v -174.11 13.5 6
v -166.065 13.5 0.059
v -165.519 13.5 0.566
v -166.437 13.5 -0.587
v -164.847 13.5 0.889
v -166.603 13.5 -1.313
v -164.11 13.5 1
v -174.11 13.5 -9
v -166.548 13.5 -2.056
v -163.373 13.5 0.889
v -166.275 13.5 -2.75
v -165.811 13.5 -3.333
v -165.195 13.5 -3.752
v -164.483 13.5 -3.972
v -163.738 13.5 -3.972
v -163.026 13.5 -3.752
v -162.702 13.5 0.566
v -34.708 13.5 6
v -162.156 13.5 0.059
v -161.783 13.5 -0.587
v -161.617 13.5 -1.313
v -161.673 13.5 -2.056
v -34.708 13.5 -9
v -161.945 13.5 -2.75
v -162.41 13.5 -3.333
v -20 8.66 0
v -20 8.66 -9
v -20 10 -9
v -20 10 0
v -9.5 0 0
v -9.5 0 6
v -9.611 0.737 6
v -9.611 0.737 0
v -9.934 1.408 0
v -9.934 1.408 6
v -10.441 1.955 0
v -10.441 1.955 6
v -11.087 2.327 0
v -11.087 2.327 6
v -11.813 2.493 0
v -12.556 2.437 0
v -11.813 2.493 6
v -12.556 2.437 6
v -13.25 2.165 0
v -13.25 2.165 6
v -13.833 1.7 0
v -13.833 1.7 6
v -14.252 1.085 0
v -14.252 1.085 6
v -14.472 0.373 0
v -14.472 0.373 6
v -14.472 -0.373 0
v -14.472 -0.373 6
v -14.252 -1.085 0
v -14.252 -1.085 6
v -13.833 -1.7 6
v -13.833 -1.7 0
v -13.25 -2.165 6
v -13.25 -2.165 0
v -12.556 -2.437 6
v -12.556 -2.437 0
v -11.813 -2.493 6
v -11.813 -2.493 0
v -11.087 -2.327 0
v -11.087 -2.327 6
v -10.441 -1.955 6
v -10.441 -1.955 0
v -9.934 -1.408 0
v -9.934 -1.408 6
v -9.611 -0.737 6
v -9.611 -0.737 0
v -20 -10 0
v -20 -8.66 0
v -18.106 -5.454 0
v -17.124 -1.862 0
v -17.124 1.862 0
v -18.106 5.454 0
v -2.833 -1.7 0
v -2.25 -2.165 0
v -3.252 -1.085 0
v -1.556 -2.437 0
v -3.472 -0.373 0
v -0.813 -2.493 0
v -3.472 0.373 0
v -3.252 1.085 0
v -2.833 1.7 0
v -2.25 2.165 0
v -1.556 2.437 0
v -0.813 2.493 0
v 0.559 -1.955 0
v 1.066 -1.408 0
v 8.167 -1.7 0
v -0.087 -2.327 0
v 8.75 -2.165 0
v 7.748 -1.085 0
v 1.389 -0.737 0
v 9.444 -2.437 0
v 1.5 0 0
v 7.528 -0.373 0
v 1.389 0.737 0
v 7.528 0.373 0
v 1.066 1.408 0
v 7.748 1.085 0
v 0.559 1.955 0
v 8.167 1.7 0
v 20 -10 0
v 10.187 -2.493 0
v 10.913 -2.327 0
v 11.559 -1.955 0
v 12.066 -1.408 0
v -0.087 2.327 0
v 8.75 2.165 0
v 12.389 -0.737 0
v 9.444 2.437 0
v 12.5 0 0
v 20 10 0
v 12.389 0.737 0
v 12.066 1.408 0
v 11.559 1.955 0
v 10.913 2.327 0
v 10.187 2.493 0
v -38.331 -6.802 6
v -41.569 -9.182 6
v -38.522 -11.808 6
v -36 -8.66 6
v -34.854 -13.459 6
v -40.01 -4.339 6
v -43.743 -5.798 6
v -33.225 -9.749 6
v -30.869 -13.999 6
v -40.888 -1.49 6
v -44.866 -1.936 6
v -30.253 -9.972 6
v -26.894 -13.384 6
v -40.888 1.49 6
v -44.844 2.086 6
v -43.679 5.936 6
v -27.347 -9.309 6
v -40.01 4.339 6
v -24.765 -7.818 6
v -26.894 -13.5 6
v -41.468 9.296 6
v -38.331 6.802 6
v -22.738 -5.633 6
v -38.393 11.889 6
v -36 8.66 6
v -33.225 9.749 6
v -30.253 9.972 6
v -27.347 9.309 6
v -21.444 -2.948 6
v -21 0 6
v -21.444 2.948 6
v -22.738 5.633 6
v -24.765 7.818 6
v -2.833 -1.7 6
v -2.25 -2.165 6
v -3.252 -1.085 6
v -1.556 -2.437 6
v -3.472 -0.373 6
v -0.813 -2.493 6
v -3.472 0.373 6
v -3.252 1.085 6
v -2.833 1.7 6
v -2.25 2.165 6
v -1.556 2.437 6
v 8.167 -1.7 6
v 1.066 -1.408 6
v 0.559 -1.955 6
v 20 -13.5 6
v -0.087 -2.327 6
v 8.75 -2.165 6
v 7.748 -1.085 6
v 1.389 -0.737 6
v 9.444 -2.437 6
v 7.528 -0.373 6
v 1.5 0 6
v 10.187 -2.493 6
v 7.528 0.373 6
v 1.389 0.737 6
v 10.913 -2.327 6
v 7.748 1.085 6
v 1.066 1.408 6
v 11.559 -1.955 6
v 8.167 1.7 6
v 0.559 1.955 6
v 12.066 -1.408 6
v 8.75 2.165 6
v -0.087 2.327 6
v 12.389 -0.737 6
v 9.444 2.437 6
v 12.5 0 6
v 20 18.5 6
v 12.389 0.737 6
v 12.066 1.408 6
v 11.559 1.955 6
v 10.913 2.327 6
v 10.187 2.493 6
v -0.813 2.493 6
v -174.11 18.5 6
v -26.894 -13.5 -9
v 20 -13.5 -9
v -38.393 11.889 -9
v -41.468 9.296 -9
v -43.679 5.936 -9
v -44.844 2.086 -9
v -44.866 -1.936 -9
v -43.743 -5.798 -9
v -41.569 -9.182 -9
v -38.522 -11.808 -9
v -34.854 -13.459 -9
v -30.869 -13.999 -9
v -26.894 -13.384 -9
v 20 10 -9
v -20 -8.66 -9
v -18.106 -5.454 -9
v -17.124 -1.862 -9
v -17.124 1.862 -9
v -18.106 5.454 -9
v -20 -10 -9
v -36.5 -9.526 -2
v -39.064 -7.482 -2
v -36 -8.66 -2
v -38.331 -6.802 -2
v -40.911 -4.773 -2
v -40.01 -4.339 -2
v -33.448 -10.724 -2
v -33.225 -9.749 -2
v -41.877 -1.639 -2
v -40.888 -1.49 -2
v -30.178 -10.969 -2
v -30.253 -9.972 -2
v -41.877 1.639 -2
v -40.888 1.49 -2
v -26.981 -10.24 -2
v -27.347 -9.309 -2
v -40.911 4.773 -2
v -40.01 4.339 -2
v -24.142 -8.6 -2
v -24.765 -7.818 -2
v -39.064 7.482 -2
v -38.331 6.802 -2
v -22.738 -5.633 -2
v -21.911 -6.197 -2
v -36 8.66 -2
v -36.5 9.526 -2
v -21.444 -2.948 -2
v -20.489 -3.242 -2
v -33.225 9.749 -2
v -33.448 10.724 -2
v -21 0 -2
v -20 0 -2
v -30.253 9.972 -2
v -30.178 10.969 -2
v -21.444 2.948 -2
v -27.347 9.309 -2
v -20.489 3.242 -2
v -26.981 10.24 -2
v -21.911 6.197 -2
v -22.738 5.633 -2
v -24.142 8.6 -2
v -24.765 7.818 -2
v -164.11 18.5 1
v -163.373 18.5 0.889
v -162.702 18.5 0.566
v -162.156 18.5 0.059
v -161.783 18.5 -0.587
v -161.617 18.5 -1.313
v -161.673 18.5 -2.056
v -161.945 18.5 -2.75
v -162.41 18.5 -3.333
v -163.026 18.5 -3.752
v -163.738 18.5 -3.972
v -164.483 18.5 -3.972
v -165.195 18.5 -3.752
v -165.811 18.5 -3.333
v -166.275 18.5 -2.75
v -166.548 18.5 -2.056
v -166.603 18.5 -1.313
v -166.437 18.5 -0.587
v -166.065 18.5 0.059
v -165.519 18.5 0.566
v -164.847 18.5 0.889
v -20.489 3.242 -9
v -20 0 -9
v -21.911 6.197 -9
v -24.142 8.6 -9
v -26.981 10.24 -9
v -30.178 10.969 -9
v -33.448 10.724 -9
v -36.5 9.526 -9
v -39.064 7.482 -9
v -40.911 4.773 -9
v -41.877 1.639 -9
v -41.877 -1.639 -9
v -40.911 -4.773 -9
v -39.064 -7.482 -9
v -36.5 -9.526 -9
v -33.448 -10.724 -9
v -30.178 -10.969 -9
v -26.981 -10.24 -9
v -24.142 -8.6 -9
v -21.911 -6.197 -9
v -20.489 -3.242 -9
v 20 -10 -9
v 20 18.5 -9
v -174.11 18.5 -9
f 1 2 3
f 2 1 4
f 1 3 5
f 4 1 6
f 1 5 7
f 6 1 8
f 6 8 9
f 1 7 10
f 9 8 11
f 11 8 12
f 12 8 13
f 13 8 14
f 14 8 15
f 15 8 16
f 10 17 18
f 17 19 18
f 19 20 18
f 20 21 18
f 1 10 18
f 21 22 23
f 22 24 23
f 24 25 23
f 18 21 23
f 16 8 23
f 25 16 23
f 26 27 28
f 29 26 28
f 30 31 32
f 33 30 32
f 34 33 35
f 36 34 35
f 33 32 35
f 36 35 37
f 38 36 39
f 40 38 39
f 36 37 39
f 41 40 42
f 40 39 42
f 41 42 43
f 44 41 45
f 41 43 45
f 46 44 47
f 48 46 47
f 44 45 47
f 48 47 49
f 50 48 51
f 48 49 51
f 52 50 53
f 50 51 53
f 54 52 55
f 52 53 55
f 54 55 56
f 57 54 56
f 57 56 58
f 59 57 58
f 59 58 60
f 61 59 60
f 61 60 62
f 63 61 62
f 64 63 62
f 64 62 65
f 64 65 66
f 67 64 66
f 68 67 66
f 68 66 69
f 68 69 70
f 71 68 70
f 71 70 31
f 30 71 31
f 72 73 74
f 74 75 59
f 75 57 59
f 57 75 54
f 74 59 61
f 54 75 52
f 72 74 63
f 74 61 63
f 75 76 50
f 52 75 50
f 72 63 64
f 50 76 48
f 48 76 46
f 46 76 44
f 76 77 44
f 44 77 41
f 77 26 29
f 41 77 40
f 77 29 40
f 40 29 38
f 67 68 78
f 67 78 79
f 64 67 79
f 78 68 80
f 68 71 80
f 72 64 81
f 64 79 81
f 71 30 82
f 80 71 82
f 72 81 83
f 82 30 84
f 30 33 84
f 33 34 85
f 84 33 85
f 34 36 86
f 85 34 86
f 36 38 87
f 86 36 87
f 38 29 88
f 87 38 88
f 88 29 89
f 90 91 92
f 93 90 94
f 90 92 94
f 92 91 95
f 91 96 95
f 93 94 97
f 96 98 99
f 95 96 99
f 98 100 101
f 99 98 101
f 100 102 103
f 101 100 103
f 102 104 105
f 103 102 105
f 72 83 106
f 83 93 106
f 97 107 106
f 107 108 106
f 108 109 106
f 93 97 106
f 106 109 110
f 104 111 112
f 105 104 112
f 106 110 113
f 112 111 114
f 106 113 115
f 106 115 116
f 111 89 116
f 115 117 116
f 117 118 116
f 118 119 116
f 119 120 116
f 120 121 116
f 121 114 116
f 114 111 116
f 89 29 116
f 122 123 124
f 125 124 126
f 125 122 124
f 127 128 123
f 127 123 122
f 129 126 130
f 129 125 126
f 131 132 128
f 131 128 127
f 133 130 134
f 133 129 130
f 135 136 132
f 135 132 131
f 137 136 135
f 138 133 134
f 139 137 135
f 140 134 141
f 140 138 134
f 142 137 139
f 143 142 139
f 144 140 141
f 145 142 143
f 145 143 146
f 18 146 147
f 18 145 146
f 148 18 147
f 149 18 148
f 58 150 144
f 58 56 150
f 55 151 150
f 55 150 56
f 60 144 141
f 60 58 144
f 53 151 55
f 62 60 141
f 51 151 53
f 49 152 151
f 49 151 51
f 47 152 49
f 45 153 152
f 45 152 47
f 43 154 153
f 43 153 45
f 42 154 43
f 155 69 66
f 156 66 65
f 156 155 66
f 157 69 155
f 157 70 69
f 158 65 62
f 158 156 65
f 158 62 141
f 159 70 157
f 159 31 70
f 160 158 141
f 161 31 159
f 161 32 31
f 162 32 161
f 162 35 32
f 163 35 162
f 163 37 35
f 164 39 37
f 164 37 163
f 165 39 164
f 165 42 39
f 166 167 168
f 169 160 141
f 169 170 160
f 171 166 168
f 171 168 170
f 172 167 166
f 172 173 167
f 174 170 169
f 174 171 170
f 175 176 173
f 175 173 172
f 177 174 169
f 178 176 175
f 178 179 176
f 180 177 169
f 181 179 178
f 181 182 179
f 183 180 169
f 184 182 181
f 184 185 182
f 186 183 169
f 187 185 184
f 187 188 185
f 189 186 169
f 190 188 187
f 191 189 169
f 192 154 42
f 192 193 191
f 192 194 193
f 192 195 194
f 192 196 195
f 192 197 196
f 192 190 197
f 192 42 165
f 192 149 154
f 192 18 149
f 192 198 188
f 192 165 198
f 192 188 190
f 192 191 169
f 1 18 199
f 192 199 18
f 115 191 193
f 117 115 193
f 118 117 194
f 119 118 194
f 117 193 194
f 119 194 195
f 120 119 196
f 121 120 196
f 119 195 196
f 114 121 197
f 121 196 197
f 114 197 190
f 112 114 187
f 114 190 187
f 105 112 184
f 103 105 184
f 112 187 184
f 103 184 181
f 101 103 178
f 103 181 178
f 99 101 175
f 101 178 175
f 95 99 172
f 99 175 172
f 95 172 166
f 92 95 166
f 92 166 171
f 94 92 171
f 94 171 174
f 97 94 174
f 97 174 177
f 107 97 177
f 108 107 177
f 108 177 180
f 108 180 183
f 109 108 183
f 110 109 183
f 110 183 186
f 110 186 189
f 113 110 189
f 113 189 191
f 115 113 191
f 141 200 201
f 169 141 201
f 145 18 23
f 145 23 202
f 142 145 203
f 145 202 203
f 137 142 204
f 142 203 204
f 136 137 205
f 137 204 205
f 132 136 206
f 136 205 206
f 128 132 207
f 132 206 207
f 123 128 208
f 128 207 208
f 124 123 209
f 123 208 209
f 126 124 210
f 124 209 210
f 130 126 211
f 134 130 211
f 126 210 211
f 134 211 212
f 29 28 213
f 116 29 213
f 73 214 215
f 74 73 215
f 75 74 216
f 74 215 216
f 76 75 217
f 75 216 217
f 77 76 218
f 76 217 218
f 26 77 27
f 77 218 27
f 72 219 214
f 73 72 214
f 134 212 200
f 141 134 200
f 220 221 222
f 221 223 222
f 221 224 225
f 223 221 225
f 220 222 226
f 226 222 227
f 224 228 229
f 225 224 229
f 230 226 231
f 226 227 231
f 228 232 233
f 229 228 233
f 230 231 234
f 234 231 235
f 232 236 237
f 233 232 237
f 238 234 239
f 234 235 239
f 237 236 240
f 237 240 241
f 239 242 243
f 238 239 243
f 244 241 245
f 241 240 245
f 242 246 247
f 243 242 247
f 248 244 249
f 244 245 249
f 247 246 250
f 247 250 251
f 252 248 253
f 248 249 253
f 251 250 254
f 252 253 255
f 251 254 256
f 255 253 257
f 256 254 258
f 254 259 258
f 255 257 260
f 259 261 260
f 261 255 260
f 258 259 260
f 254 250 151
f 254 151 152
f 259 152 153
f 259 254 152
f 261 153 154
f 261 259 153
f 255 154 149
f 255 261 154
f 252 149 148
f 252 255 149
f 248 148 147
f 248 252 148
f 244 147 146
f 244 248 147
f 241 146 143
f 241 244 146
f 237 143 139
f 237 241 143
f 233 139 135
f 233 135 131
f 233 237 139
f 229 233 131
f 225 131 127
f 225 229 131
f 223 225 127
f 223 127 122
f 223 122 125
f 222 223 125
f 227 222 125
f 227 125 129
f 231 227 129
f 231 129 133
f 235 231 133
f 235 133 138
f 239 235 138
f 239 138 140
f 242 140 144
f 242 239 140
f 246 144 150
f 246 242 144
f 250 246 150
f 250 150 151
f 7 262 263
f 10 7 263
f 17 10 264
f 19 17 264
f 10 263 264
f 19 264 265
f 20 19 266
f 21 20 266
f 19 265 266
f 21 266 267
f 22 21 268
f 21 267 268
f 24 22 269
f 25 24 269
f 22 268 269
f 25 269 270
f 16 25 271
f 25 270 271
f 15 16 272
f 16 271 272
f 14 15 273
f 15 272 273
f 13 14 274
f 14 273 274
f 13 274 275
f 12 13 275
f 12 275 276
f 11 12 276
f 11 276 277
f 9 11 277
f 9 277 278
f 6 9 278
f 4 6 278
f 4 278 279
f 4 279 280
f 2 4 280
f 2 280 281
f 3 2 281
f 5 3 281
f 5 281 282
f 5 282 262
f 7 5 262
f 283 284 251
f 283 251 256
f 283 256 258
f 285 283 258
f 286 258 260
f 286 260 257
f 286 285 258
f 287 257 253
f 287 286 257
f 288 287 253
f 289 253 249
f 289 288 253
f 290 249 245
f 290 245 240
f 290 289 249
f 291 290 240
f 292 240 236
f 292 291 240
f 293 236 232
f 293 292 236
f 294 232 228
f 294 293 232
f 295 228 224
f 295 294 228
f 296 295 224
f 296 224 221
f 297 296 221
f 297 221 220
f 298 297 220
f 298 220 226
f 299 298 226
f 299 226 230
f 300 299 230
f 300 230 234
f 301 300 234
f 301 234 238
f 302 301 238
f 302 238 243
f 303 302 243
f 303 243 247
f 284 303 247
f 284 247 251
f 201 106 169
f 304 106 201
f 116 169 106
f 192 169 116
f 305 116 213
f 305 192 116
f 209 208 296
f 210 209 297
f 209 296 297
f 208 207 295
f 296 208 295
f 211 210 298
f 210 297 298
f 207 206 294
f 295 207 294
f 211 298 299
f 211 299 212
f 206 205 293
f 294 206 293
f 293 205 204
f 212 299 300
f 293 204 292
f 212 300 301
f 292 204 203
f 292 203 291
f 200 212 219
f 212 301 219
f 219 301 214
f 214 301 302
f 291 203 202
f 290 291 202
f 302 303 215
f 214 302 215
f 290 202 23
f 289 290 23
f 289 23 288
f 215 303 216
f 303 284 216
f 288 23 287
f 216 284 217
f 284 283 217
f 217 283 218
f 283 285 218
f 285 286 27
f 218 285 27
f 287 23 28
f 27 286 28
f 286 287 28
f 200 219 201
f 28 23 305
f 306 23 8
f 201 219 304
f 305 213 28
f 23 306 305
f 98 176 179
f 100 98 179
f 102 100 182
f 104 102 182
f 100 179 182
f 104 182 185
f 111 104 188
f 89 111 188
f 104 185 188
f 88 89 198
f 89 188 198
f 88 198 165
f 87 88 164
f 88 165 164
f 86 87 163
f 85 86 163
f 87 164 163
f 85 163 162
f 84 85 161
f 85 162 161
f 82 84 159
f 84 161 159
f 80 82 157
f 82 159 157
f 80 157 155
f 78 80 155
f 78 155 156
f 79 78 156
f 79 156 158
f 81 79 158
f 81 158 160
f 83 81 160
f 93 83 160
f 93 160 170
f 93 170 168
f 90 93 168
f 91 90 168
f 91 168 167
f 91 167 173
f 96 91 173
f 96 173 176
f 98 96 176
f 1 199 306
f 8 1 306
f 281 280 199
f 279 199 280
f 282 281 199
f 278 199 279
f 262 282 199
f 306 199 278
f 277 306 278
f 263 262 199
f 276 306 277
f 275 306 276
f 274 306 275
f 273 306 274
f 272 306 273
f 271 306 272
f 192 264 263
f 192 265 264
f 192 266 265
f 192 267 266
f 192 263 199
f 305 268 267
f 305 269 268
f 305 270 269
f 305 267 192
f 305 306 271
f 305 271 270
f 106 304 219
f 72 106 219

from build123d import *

# Parameters (mm, degrees)
SKETCH_1_W          = 40
SKETCH_1_H          = 20
EXTRUDE_1_DEPTH     = 6
SKETCH_2_R          = 2.5
CUT_EXTRUDE_1_DEPTH = 24.151673806
EXTRUDE_START       = -15
EXTRUDE_2_OUTLINE_R = 11
EXTRUDE_2_DEPTH     = 15
EXTRUDE_START_2     = -8
SKETCH_5_R          = 11
SKETCH_5_R_2        = 10
EXTRUDE_3_DEPTH     = 8
SKETCH_8_W          = 15
SKETCH_8_H          = 5
EXTRUDE_4_DEPTH     = 200
SKETCH_9_W          = 4.403653586
SKETCH_9_H          = 3.736433346
EXTRUDE_5_DEPTH     = 15
SKETCH_13_W         = 64.67728996
SKETCH_13_H         = 18.524474632
CUT_EXTRUDE_2_DEPTH = 184.131783151
SKETCH_15_W         = 55.676477601
SKETCH_15_H         = 15
EXTRUDE_6_DEPTH     = 5
SKETCH_16_R         = 2.5
CUT_EXTRUDE_3_DEPTH = 10


# Read off the part's stored shape, not the designer's step: 凸台-拉伸2
with BuildPart() as part:
    # 草图1 → 凸台-拉伸1 (new body)
    with BuildSketch(Plane.XY):
        Rectangle(SKETCH_1_W, SKETCH_1_H)
    extrude(amount=EXTRUDE_1_DEPTH)

    # 草图2 → 切除-拉伸1 (cut, through all)
    with BuildSketch(Plane.XY.offset(6)):
        with Locations((10, 0)):
            Circle(SKETCH_2_R)
        with Locations((-1, 0)):
            Circle(SKETCH_2_R)
        with Locations((-12, 0)):
            Circle(SKETCH_2_R)
    extrude(amount=-CUT_EXTRUDE_1_DEPTH, mode=Mode.SUBTRACT)

    # 凸台-拉伸2 outline → 凸台-拉伸2 (add)
    with BuildSketch(Plane.XY.offset(6).offset(EXTRUDE_START)):
        with BuildLine():
            Line((20, 10), (20, 13.5))
            Line((20, 13.5), (-26.893967141, 13.5))
            Line((-26.893967141, 13.5), (-26.893967141, 13.384337644))
            ThreePointArc((-26.893967141, 13.384337644), (-45, 0), (-26.893967141, -13.384337644))
            Line((-26.893967141, -13.384337644), (-26.893967141, -13.5))
            Line((-26.893967141, -13.5), (20, -13.5))
            Line((20, -13.5), (20, -10))
            Line((20, -10), (-20, -10))
            Line((-20, -10), (-20, -8.660254038))
            ThreePointArc((-20, -8.660254038), (-17, 0), (-20, 8.660254038))
            Line((-20, 8.660254038), (-20, 10))
            Line((-20, 10), (20, 10))
        make_face()
        with Locations((-31, 0)):
            Circle(EXTRUDE_2_OUTLINE_R, mode=Mode.SUBTRACT)
    extrude(amount=EXTRUDE_2_DEPTH)

    # 草图5 → 凸台-拉伸3 (add)
    with BuildSketch(Plane.XY.offset(6).offset(EXTRUDE_START_2)):
        with Locations((-31, 0)):
            Circle(SKETCH_5_R)
        with Locations((-31, 0)):
            Circle(SKETCH_5_R_2, mode=Mode.SUBTRACT)
    extrude(amount=EXTRUDE_3_DEPTH)

    # 草图8 → 凸台-拉伸4 (add)
    with BuildSketch(Plane(origin=(20, 0, 0), x_dir=(0, 0, -1), z_dir=(1, 0, 0))):
        with Locations((1.5, 16)):
            Rectangle(SKETCH_8_W, SKETCH_8_H)
    extrude(amount=-EXTRUDE_4_DEPTH)

    # 草图9 → 凸台-拉伸5 (add, through all)
    with BuildSketch(Plane.XY.offset(6)):
        with Locations((-27.364497847, 13.796597935)):
            Rectangle(SKETCH_9_W, SKETCH_9_H)
    extrude(amount=-EXTRUDE_5_DEPTH)

    # 草图13 → 切除-拉伸2 (cut, through all)
    with BuildSketch(Plane(origin=(0, 18.5, 0), x_dir=(1, 0, 0), z_dir=(0, 1, 0))):
        with Locations((-150.772464122, 3.262237316)):
            Rectangle(SKETCH_13_W, SKETCH_13_H)
    extrude(amount=-CUT_EXTRUDE_2_DEPTH, mode=Mode.SUBTRACT)

    # 草图15 → 凸台-拉伸6 (add)
    with BuildSketch(Plane(origin=(0, 18.5, 0), x_dir=(1, 0, 0), z_dir=(0, 1, 0))):
        with Locations((-146.272057942, 1.5)):
            Rectangle(SKETCH_15_W, SKETCH_15_H)
    extrude(amount=-EXTRUDE_6_DEPTH)

    # 草图16 → 切除-拉伸3 (cut)
    with BuildSketch(Plane(origin=(0, 18.5, 0), x_dir=(1, 0, 0), z_dir=(0, 1, 0))):
        with Locations(Location((-164.110296743, 1.5, 0), (0, 0, 270))):
            Circle(SKETCH_16_R)
    extrude(amount=-CUT_EXTRUDE_3_DEPTH, mode=Mode.SUBTRACT)


solid = part.part
